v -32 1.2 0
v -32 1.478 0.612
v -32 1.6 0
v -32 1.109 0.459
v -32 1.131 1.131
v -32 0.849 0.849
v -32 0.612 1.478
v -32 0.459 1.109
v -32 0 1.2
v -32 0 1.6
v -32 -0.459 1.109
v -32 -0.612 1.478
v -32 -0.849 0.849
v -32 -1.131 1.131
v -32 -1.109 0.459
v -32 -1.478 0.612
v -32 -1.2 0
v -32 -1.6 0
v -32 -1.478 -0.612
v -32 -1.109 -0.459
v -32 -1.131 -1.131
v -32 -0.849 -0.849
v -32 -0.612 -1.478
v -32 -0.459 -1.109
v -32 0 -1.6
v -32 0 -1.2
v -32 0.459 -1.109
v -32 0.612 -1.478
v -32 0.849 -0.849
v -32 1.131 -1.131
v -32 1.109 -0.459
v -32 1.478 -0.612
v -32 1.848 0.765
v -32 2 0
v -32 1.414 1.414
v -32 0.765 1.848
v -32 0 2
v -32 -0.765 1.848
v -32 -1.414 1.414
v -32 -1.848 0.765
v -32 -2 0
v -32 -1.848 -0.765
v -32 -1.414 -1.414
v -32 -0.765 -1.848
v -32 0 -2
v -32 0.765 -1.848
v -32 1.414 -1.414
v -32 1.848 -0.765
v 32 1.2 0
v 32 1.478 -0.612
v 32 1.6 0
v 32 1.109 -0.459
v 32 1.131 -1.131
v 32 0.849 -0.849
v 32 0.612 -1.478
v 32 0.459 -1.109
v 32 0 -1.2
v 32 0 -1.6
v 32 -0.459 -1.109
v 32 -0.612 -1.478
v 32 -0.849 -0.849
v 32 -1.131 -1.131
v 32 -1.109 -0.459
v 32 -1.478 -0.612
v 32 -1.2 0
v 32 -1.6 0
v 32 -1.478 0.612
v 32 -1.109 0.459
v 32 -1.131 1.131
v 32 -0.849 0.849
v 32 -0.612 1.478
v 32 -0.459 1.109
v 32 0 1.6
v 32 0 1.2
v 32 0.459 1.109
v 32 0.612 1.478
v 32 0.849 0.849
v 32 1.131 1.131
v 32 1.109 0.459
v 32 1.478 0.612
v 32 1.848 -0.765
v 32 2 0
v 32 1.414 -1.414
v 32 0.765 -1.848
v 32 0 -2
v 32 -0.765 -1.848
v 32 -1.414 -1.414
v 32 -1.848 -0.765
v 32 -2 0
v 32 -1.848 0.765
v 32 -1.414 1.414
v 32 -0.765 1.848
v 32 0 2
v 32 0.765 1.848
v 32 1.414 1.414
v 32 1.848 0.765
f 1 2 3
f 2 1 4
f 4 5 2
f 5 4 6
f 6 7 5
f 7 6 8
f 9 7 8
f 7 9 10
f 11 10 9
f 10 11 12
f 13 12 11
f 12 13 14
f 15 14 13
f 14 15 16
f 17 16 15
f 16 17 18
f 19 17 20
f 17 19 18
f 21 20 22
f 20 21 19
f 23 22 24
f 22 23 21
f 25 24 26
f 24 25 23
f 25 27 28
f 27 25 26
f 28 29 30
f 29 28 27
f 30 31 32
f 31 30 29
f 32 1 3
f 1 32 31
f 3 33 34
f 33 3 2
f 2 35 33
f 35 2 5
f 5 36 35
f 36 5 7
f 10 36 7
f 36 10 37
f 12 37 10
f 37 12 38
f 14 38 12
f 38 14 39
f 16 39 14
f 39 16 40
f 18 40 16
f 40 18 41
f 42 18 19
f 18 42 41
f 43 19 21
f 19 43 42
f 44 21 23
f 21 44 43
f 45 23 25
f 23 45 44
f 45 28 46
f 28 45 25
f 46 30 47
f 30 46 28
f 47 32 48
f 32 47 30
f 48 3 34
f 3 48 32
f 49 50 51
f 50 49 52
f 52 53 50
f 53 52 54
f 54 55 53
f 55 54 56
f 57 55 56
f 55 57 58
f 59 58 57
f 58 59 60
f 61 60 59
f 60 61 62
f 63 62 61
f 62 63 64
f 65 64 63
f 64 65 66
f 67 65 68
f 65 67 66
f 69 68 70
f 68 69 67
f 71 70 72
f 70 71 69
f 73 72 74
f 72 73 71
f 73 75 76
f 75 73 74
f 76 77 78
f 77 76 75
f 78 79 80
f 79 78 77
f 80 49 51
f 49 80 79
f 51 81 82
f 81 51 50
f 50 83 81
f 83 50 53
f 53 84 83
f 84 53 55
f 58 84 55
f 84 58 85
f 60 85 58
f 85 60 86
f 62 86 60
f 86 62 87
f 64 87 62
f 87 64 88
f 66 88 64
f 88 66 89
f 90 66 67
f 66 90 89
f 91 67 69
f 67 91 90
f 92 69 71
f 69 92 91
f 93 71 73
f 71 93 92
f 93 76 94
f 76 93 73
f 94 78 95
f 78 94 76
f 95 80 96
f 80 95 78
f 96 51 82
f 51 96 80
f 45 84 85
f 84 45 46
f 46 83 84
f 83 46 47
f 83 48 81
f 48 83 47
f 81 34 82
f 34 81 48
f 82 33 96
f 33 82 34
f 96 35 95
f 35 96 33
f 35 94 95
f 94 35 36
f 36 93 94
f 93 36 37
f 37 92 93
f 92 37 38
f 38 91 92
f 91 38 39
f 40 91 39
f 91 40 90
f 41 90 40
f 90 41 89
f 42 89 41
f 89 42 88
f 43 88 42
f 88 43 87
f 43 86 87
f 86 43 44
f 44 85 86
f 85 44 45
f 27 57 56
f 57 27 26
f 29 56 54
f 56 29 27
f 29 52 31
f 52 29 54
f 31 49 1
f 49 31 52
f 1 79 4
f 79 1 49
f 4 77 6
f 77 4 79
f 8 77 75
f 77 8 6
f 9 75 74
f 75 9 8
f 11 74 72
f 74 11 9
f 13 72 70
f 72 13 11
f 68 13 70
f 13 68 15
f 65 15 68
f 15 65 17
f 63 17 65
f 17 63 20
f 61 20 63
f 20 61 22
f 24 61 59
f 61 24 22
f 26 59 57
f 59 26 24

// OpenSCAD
// file: ../p/4-4cyli.scad
use <../lib.scad>
function ldraw_lib__4_4cyli() = [
// 0 Cylinder 1.0
// 0 Name: 4-4cyli.dat
// 0 Author: James Jessiman
// 0 !LDRAW_ORG Primitive UPDATE 2005-01
// 0 !LICENSE Licensed under CC BY 2.0 and CC BY 4.0 : see CAreadme.txt
// 
// 0 BFC CERTIFY CCW
  [0,"BFC","CERTIFY"],
  [0,"BFC","CCW"],
// 
// 0 !HISTORY 1998-12-15 [PTadmin] Official Update 1998-10
// 0 !HISTORY 2002-03-23 [sbliss] Added BFC statement; merged headers from files in distributions LDraw 0.27 and Complete.
// 0 !HISTORY 2002-04-25 [PTadmin] Official Update 2002-02
// 0 !HISTORY 2004-12-14 [guyvivan] BFC CCW
// 0 !HISTORY 2005-12-28 [PTadmin] Official Update 2005-01
// 0 !HISTORY 2007-06-24 [PTadmin] Header formatted for Contributor Agreement
// 0 !HISTORY 2008-07-01 [PTadmin] Official Update 2008-01
// 
// 
// 4 16 1 1 0 0.9239 1 0.3827 0.9239 0 0.3827 1 0 0
  [4,16,1,1,0,0.9239,1,0.3827,0.9239,0,0.3827,1,0,0],
// 5 24 1 0 0 1 1 0 0.9239 0 0.3827 0.9239 0 -0.3827
  [5,24,1,0,0,1,1,0,0.9239,0,0.3827,0.9239,0,-0.3827],
// 4 16 0.9239 1 0.3827 0.7071 1 0.7071 0.7071 0 0.7071 0.9239 0 0.3827
  [4,16,0.9239,1,0.3827,0.7071,1,0.7071,0.7071,0,0.7071,0.9239,0,0.3827],
// 5 24 0.9239 0 0.3827 0.9239 1 0.3827 0.7071 0 0.7071 1 0 0
  [5,24,0.9239,0,0.3827,0.9239,1,0.3827,0.7071,0,0.7071,1,0,0],
// 4 16 0.7071 1 0.7071 0.3827 1 0.9239 0.3827 0 0.9239 0.7071 0 0.7071
  [4,16,0.7071,1,0.7071,0.3827,1,0.9239,0.3827,0,0.9239,0.7071,0,0.7071],
// 5 24 0.7071 0 0.7071 0.7071 1 0.7071 0.3827 0 0.9239 0.9239 0 0.3827
  [5,24,0.7071,0,0.7071,0.7071,1,0.7071,0.3827,0,0.9239,0.9239,0,0.3827],
// 4 16 0.3827 1 0.9239 0 1 1 0 0 1 0.3827 0 0.9239
  [4,16,0.3827,1,0.9239,0,1,1,0,0,1,0.3827,0,0.9239],
// 5 24 0.3827 0 0.9239 0.3827 1 0.9239 0 0 1 0.7071 0 0.7071
  [5,24,0.3827,0,0.9239,0.3827,1,0.9239,0,0,1,0.7071,0,0.7071],
// 4 16 0 1 1 -0.3827 1 0.9239 -0.3827 0 0.9239 0 0 1
  [4,16,0,1,1,-0.3827,1,0.9239,-0.3827,0,0.9239,0,0,1],
// 5 24 0 0 1 0 1 1 -0.3827 0 0.9239 0.3827 0 0.9239
  [5,24,0,0,1,0,1,1,-0.3827,0,0.9239,0.3827,0,0.9239],
// 4 16 -0.3827 1 0.9239 -0.7071 1 0.7071 -0.7071 0 0.7071 -0.3827 0 0.9239
  [4,16,-0.3827,1,0.9239,-0.7071,1,0.7071,-0.7071,0,0.7071,-0.3827,0,0.9239],
// 5 24 -0.3827 0 0.9239 -0.3827 1 0.9239 -0.7071 0 0.7071 0 0 1
  [5,24,-0.3827,0,0.9239,-0.3827,1,0.9239,-0.7071,0,0.7071,0,0,1],
// 4 16 -0.7071 1 0.7071 -0.9239 1 0.3827 -0.9239 0 0.3827 -0.7071 0 0.7071
  [4,16,-0.7071,1,0.7071,-0.9239,1,0.3827,-0.9239,0,0.3827,-0.7071,0,0.7071],
// 5 24 -0.7071 0 0.7071 -0.7071 1 0.7071 -0.9239 0 0.3827 -0.3827 0 0.9239
  [5,24,-0.7071,0,0.7071,-0.7071,1,0.7071,-0.9239,0,0.3827,-0.3827,0,0.9239],
// 4 16 -0.9239 1 0.3827 -1 1 0 -1 0 0 -0.9239 0 0.3827
  [4,16,-0.9239,1,0.3827,-1,1,0,-1,0,0,-0.9239,0,0.3827],
// 5 24 -0.9239 0 0.3827 -0.9239 1 0.3827 -1 0 0 -0.7071 0 0.7071
  [5,24,-0.9239,0,0.3827,-0.9239,1,0.3827,-1,0,0,-0.7071,0,0.7071],
// 4 16 -1 1 0 -0.9239 1 -0.3827 -0.9239 0 -0.3827 -1 0 0
  [4,16,-1,1,0,-0.9239,1,-0.3827,-0.9239,0,-0.3827,-1,0,0],
// 5 24 -1 0 0 -1 1 0 -0.9239 0 -0.3827 -0.9239 0 0.3827
  [5,24,-1,0,0,-1,1,0,-0.9239,0,-0.3827,-0.9239,0,0.3827],
// 4 16 -0.9239 1 -0.3827 -0.7071 1 -0.7071 -0.7071 0 -0.7071 -0.9239 0 -0.3827
  [4,16,-0.9239,1,-0.3827,-0.7071,1,-0.7071,-0.7071,0,-0.7071,-0.9239,0,-0.3827],
// 5 24 -0.9239 0 -0.3827 -0.9239 1 -0.3827 -0.7071 0 -0.7071 -1 0 0
  [5,24,-0.9239,0,-0.3827,-0.9239,1,-0.3827,-0.7071,0,-0.7071,-1,0,0],
// 4 16 -0.7071 1 -0.7071 -0.3827 1 -0.9239 -0.3827 0 -0.9239 -0.7071 0 -0.7071
  [4,16,-0.7071,1,-0.7071,-0.3827,1,-0.9239,-0.3827,0,-0.9239,-0.7071,0,-0.7071],
// 5 24 -0.7071 0 -0.7071 -0.7071 1 -0.7071 -0.3827 0 -0.9239 -0.9239 0 -0.3827
  [5,24,-0.7071,0,-0.7071,-0.7071,1,-0.7071,-0.3827,0,-0.9239,-0.9239,0,-0.3827],
// 4 16 -0.3827 1 -0.9239 0 1 -1 0 0 -1 -0.3827 0 -0.9239
  [4,16,-0.3827,1,-0.9239,0,1,-1,0,0,-1,-0.3827,0,-0.9239],
// 5 24 -0.3827 0 -0.9239 -0.3827 1 -0.9239 0 0 -1 -0.7071 0 -0.7071
  [5,24,-0.3827,0,-0.9239,-0.3827,1,-0.9239,0,0,-1,-0.7071,0,-0.7071],
// 4 16 0 1 -1 0.3827 1 -0.9239 0.3827 0 -0.9239 0 0 -1
  [4,16,0,1,-1,0.3827,1,-0.9239,0.3827,0,-0.9239,0,0,-1],
// 5 24 0 0 -1 0 1 -1 0.3827 0 -0.9239 -0.3827 0 -0.9239
  [5,24,0,0,-1,0,1,-1,0.3827,0,-0.9239,-0.3827,0,-0.9239],
// 4 16 0.3827 1 -0.9239 0.7071 1 -0.7071 0.7071 0 -0.7071 0.3827 0 -0.9239
  [4,16,0.3827,1,-0.9239,0.7071,1,-0.7071,0.7071,0,-0.7071,0.3827,0,-0.9239],
// 5 24 0.3827 0 -0.9239 0.3827 1 -0.9239 0.7071 0 -0.7071 0 0 -1
  [5,24,0.3827,0,-0.9239,0.3827,1,-0.9239,0.7071,0,-0.7071,0,0,-1],
// 4 16 0.7071 1 -0.7071 0.9239 1 -0.3827 0.9239 0 -0.3827 0.7071 0 -0.7071
  [4,16,0.7071,1,-0.7071,0.9239,1,-0.3827,0.9239,0,-0.3827,0.7071,0,-0.7071],
// 5 24 0.7071 0 -0.7071 0.7071 1 -0.7071 0.9239 0 -0.3827 0.3827 0 -0.9239
  [5,24,0.7071,0,-0.7071,0.7071,1,-0.7071,0.9239,0,-0.3827,0.3827,0,-0.9239],
// 4 16 0.9239 1 -0.3827 1 1 0 1 0 0 0.9239 0 -0.3827
  [4,16,0.9239,1,-0.3827,1,1,0,1,0,0,0.9239,0,-0.3827],
// 5 24 0.9239 0 -0.3827 0.9239 1 -0.3827 1 0 0 0.7071 0 -0.7071
  [5,24,0.9239,0,-0.3827,0.9239,1,-0.3827,1,0,0,0.7071,0,-0.7071],
// 0
];
makepoly(ldraw_lib__4_4cyli(), line=0.2);
// file: ../p/4-4ring4.scad
use <../lib.scad>
function ldraw_lib__4_4ring4() = [
// 0 Ring  4 x 1.0
// 0 Name: 4-4ring4.dat
// 0 Author: James Jessiman
// 0 !LDRAW_ORG Primitive UPDATE 2009-01
// 0 !LICENSE Licensed under CC BY 2.0 and CC BY 4.0 : see CAreadme.txt
// 
// 0 BFC CERTIFY CCW
  [0,"BFC","CERTIFY"],
  [0,"BFC","CCW"],
// 
// 0 !HISTORY 1998-12-15 [PTadmin] Official Update 1998-10
// 0 !HISTORY 2002-04-08 [BrickCaster] Modified for BFC compliance
// 0 !HISTORY 2002-04-25 [PTadmin] Official Update 2002-02
// 0 !HISTORY 2007-06-24 [PTadmin] Header formatted for Contributor Agreement
// 0 !HISTORY 2008-07-01 [PTadmin] Official Update 2008-01
// 0 !HISTORY 2008-08-26 [cwdee] Switch polygon winding and rename
// 0 !HISTORY 2009-05-02 [PTadmin] Official Update 2009-01
// 
// 
// 4 16 -1.9135 0 4.6195 -1.5308 0 3.6956 0 0 4 0 0 5
  [4,16,-1.9135,0,4.6195,-1.5308,0,3.6956,0,0,4,0,0,5],
// 4 16 -3.5355 0 3.5355 -2.8284 0 2.8284 -1.5308 0 3.6956 -1.9135 0 4.6195
  [4,16,-3.5355,0,3.5355,-2.8284,0,2.8284,-1.5308,0,3.6956,-1.9135,0,4.6195],
// 4 16 -4.6195 0 1.9135 -3.6956 0 1.5308 -2.8284 0 2.8284 -3.5355 0 3.5355
  [4,16,-4.6195,0,1.9135,-3.6956,0,1.5308,-2.8284,0,2.8284,-3.5355,0,3.5355],
// 4 16 -5 0 0 -4 0 0 -3.6956 0 1.5308 -4.6195 0 1.9135
  [4,16,-5,0,0,-4,0,0,-3.6956,0,1.5308,-4.6195,0,1.9135],
// 4 16 -4.6195 0 -1.9135 -3.6956 0 -1.5308 -4 0 0 -5 0 0
  [4,16,-4.6195,0,-1.9135,-3.6956,0,-1.5308,-4,0,0,-5,0,0],
// 4 16 -3.5355 0 -3.5355 -2.8284 0 -2.8284 -3.6956 0 -1.5308 -4.6195 0 -1.9135
  [4,16,-3.5355,0,-3.5355,-2.8284,0,-2.8284,-3.6956,0,-1.5308,-4.6195,0,-1.9135],
// 4 16 -1.9135 0 -4.6195 -1.5308 0 -3.6956 -2.8284 0 -2.8284 -3.5355 0 -3.5355
  [4,16,-1.9135,0,-4.6195,-1.5308,0,-3.6956,-2.8284,0,-2.8284,-3.5355,0,-3.5355],
// 4 16 0 0 -5 0 0 -4 -1.5308 0 -3.6956 -1.9135 0 -4.6195
  [4,16,0,0,-5,0,0,-4,-1.5308,0,-3.6956,-1.9135,0,-4.6195],
// 4 16 1.9135 0 -4.6195 1.5308 0 -3.6956 0 0 -4 0 0 -5
  [4,16,1.9135,0,-4.6195,1.5308,0,-3.6956,0,0,-4,0,0,-5],
// 4 16 3.5355 0 -3.5355 2.8284 0 -2.8284 1.5308 0 -3.6956 1.9135 0 -4.6195
  [4,16,3.5355,0,-3.5355,2.8284,0,-2.8284,1.5308,0,-3.6956,1.9135,0,-4.6195],
// 4 16 4.6195 0 -1.9135 3.6956 0 -1.5308 2.8284 0 -2.8284 3.5355 0 -3.5355
  [4,16,4.6195,0,-1.9135,3.6956,0,-1.5308,2.8284,0,-2.8284,3.5355,0,-3.5355],
// 4 16 5 0 0 4 0 0 3.6956 0 -1.5308 4.6195 0 -1.9135
  [4,16,5,0,0,4,0,0,3.6956,0,-1.5308,4.6195,0,-1.9135],
// 4 16 4.6195 0 1.9135 3.6956 0 1.5308 4 0 0 5 0 0
  [4,16,4.6195,0,1.9135,3.6956,0,1.5308,4,0,0,5,0,0],
// 4 16 3.5355 0 3.5355 2.8284 0 2.8284 3.6956 0 1.5308 4.6195 0 1.9135
  [4,16,3.5355,0,3.5355,2.8284,0,2.8284,3.6956,0,1.5308,4.6195,0,1.9135],
// 4 16 1.9135 0 4.6195 1.5308 0 3.6956 2.8284 0 2.8284 3.5355 0 3.5355
  [4,16,1.9135,0,4.6195,1.5308,0,3.6956,2.8284,0,2.8284,3.5355,0,3.5355],
// 4 16 0 0 5 0 0 4 1.5308 0 3.6956 1.9135 0 4.6195
  [4,16,0,0,5,0,0,4,1.5308,0,3.6956,1.9135,0,4.6195],
// 0
];
makepoly(ldraw_lib__4_4ring4(), line=0.2);
// file: ../p/4-4ring3.scad
use <../lib.scad>
function ldraw_lib__4_4ring3() = [
// 0 Ring  3 x 1.0
// 0 Name: 4-4ring3.dat
// 0 Author: James Jessiman
// 0 !LDRAW_ORG Primitive UPDATE 2009-01
// 0 !LICENSE Licensed under CC BY 2.0 and CC BY 4.0 : see CAreadme.txt
// 
// 0 BFC CERTIFY CCW
  [0,"BFC","CERTIFY"],
  [0,"BFC","CCW"],
// 
// 0 !HISTORY 1998-12-15 [PTadmin] Official Update 1998-10
// 0 !HISTORY 2002-04-05 [hafhead] Added BFC statement
// 0 !HISTORY 2002-04-25 [PTadmin] Official Update 2002-02
// 0 !HISTORY 2007-06-24 [PTadmin] Header formatted for Contributor Agreement
// 0 !HISTORY 2008-07-01 [PTadmin] Official Update 2008-01
// 0 !HISTORY 2008-08-26 [cwdee] Switch polygon winding and rename
// 0 !HISTORY 2009-05-02 [PTadmin] Official Update 2009-01
// 
// 
// 4 16 -1.5308 0 3.6956 -1.1481 0 2.7717 0 0 3 0 0 4
  [4,16,-1.5308,0,3.6956,-1.1481,0,2.7717,0,0,3,0,0,4],
// 4 16 -2.8284 0 2.8284 -2.1213 0 2.1213 -1.1481 0 2.7717 -1.5308 0 3.6956
  [4,16,-2.8284,0,2.8284,-2.1213,0,2.1213,-1.1481,0,2.7717,-1.5308,0,3.6956],
// 4 16 -3.6956 0 1.5308 -2.7717 0 1.1481 -2.1213 0 2.1213 -2.8284 0 2.8284
  [4,16,-3.6956,0,1.5308,-2.7717,0,1.1481,-2.1213,0,2.1213,-2.8284,0,2.8284],
// 4 16 -4 0 0 -3 0 0 -2.7717 0 1.1481 -3.6956 0 1.5308
  [4,16,-4,0,0,-3,0,0,-2.7717,0,1.1481,-3.6956,0,1.5308],
// 4 16 -3.6956 0 -1.5308 -2.7717 0 -1.1481 -3 0 0 -4 0 0
  [4,16,-3.6956,0,-1.5308,-2.7717,0,-1.1481,-3,0,0,-4,0,0],
// 4 16 -2.8284 0 -2.8284 -2.1213 0 -2.1213 -2.7717 0 -1.1481 -3.6956 0 -1.5308
  [4,16,-2.8284,0,-2.8284,-2.1213,0,-2.1213,-2.7717,0,-1.1481,-3.6956,0,-1.5308],
// 4 16 -1.5308 0 -3.6956 -1.1481 0 -2.7717 -2.1213 0 -2.1213 -2.8284 0 -2.8284
  [4,16,-1.5308,0,-3.6956,-1.1481,0,-2.7717,-2.1213,0,-2.1213,-2.8284,0,-2.8284],
// 4 16 0 0 -4 0 0 -3 -1.1481 0 -2.7717 -1.5308 0 -3.6956
  [4,16,0,0,-4,0,0,-3,-1.1481,0,-2.7717,-1.5308,0,-3.6956],
// 4 16 1.5308 0 -3.6956 1.1481 0 -2.7717 0 0 -3 0 0 -4
  [4,16,1.5308,0,-3.6956,1.1481,0,-2.7717,0,0,-3,0,0,-4],
// 4 16 2.8284 0 -2.8284 2.1213 0 -2.1213 1.1481 0 -2.7717 1.5308 0 -3.6956
  [4,16,2.8284,0,-2.8284,2.1213,0,-2.1213,1.1481,0,-2.7717,1.5308,0,-3.6956],
// 4 16 3.6956 0 -1.5308 2.7717 0 -1.1481 2.1213 0 -2.1213 2.8284 0 -2.8284
  [4,16,3.6956,0,-1.5308,2.7717,0,-1.1481,2.1213,0,-2.1213,2.8284,0,-2.8284],
// 4 16 4 0 0 3 0 0 2.7717 0 -1.1481 3.6956 0 -1.5308
  [4,16,4,0,0,3,0,0,2.7717,0,-1.1481,3.6956,0,-1.5308],
// 4 16 3.6956 0 1.5308 2.7717 0 1.1481 3 0 0 4 0 0
  [4,16,3.6956,0,1.5308,2.7717,0,1.1481,3,0,0,4,0,0],
// 4 16 2.8284 0 2.8284 2.1213 0 2.1213 2.7717 0 1.1481 3.6956 0 1.5308
  [4,16,2.8284,0,2.8284,2.1213,0,2.1213,2.7717,0,1.1481,3.6956,0,1.5308],
// 4 16 1.5308 0 3.6956 1.1481 0 2.7717 2.1213 0 2.1213 2.8284 0 2.8284
  [4,16,1.5308,0,3.6956,1.1481,0,2.7717,2.1213,0,2.1213,2.8284,0,2.8284],
// 4 16 0 0 4 0 0 3 1.1481 0 2.7717 1.5308 0 3.6956
  [4,16,0,0,4,0,0,3,1.1481,0,2.7717,1.5308,0,3.6956],
// 0
];
makepoly(ldraw_lib__4_4ring3(), line=0.2);
// file: ../p/4-4edge.scad
use <../lib.scad>
function ldraw_lib__4_4edge() = [
// 0 Circle 1.0
// 0 Name: 4-4edge.dat
// 0 Author: James Jessiman
// 0 !LDRAW_ORG Primitive UPDATE 2017-01
// 0 !LICENSE Licensed under CC BY 2.0 and CC BY 4.0 : see CAreadme.txt
// 
// 0 BFC CERTIFY CCW
  [0,"BFC","CERTIFY"],
  [0,"BFC","CCW"],
// 
// 0 !HISTORY 1998-12-15 [PTadmin] Official Update 1998-10
// 0 !HISTORY 2005-12-28 [PTadmin] Official Update 2005-01
// 0 !HISTORY 2007-06-24 [PTadmin] Header formatted for Contributor Agreement
// 0 !HISTORY 2008-07-01 [PTadmin] Official Update 2008-01
// 0 !HISTORY 2017-01-15 [Steffen] BFCed
// 0 !HISTORY 2017-12-30 [PTadmin] Official Update 2017-01
// 
// 
// 2 24 1 0 0 0.9239 0 0.3827
  [2,24,1,0,0,0.9239,0,0.3827],
// 2 24 0.9239 0 0.3827 0.7071 0 0.7071
  [2,24,0.9239,0,0.3827,0.7071,0,0.7071],
// 2 24 0.7071 0 0.7071 0.3827 0 0.9239
  [2,24,0.7071,0,0.7071,0.3827,0,0.9239],
// 2 24 0.3827 0 0.9239 0 0 1
  [2,24,0.3827,0,0.9239,0,0,1],
// 2 24 0 0 1 -0.3827 0 0.9239
  [2,24,0,0,1,-0.3827,0,0.9239],
// 2 24 -0.3827 0 0.9239 -0.7071 0 0.7071
  [2,24,-0.3827,0,0.9239,-0.7071,0,0.7071],
// 2 24 -0.7071 0 0.7071 -0.9239 0 0.3827
  [2,24,-0.7071,0,0.7071,-0.9239,0,0.3827],
// 2 24 -0.9239 0 0.3827 -1 0 -0
  [2,24,-0.9239,0,0.3827,-1,0,-0],
// 2 24 -1 0 -0 -0.9239 0 -0.3827
  [2,24,-1,0,-0,-0.9239,0,-0.3827],
// 2 24 -0.9239 0 -0.3827 -0.7071 0 -0.7071
  [2,24,-0.9239,0,-0.3827,-0.7071,0,-0.7071],
// 2 24 -0.7071 0 -0.7071 -0.3827 0 -0.9239
  [2,24,-0.7071,0,-0.7071,-0.3827,0,-0.9239],
// 2 24 -0.3827 0 -0.9239 0 0 -1
  [2,24,-0.3827,0,-0.9239,0,0,-1],
// 2 24 0 0 -1 0.3827 0 -0.9239
  [2,24,0,0,-1,0.3827,0,-0.9239],
// 2 24 0.3827 0 -0.9239 0.7071 0 -0.7071
  [2,24,0.3827,0,-0.9239,0.7071,0,-0.7071],
// 2 24 0.7071 0 -0.7071 0.9239 0 -0.3827
  [2,24,0.7071,0,-0.7071,0.9239,0,-0.3827],
// 2 24 0.9239 0 -0.3827 1 0 0
  [2,24,0.9239,0,-0.3827,1,0,0],
];
makepoly(ldraw_lib__4_4edge(), line=0.2);
// file: 71533k03.scad
use <../lib.scad>
use <../p/4-4cyli.scad>
function ldraw_lib__71533k03() = [
// 0 ~Technic Pneumatic Tube Segment
// 0 Name: 71533k03.dat
// 0 Author: Jaco van der Molen [Jaco]
// 0 !LDRAW_ORG Part Flexible_Section UPDATE 2020-01
// 0 !LICENSE Licensed under CC BY 2.0 and CC BY 4.0 : see CAreadme.txt
// 
// 0 BFC CERTIFY CW
  [0,"BFC","CERTIFY"],
  [0,"BFC","CW"],
// 
// 0 !HISTORY 2003-11-30 [Steffen] BFCed
// 0 !HISTORY 2009-12-29 [PTadmin] Official Update 2009-03
// 0 !HISTORY 2020-06-27 [PTadmin] Renamed from 166
// 0 !HISTORY 2020-06-28 [PTadmin] Official Update 2020-01
// 
// 
// 1 16 0 0 0 5 0 0 0 1 0 0 0 5 4-4cyli.dat
  [1,16,0,0,0,5,0,0,0,1,0,0,0,5, ldraw_lib__4_4cyli()],
// 0 BFC INVERTNEXT
  [0,"BFC","INVERTNEXT"],
// 1 16 0 0 0 3 0 0 0 1 0 0 0 3 4-4cyli.dat
  [1,16,0,0,0,3,0,0,0,1,0,0,0,3, ldraw_lib__4_4cyli()],
// 0
];
makepoly(ldraw_lib__71533k03(), line=0.2);
// file: 71533k02.scad
use <../lib.scad>
use <../p/4-4edge.scad>
use <../p/4-4ring3.scad>
use <../p/4-4ring4.scad>
function ldraw_lib__71533k02() = [
// 0 ~Technic Pneumatic Tube End (Non-Bulged)
// 0 Name: 71533k02.dat
// 0 Author: Steffen [Steffen]
// 0 !LDRAW_ORG Part Flexible_Section UPDATE 2020-01
// 0 !LICENSE Licensed under CC BY 2.0 and CC BY 4.0 : see CAreadme.txt
// 
// 0 BFC CERTIFY CCW
  [0,"BFC","CERTIFY"],
  [0,"BFC","CCW"],
// 
// 0 !HISTORY 2020-06-28 [PTadmin] Official Update 2020-01
// 
// 
// 0 // This file goes together with 71533k01.dat and 71533k03.dat.
// 0 // Those 3 files can be used to create Technic Pneumatic Tubes
// 0 // with either bulged or non-bulged ends.
// 
// 1 16 0 0 0 1 0 0 0 1 0 0 0 1 4-4ring3.dat
  [1,16,0,0,0,1,0,0,0,1,0,0,0,1, ldraw_lib__4_4ring3()],
// 1 16 0 0 0 1 0 0 0 1 0 0 0 1 4-4ring4.dat
  [1,16,0,0,0,1,0,0,0,1,0,0,0,1, ldraw_lib__4_4ring4()],
// 1 16 0 0 0 3 0 0 0 3 0 0 0 3 4-4edge.dat
  [1,16,0,0,0,3,0,0,0,3,0,0,0,3, ldraw_lib__4_4edge()],
// 1 16 0 0 0 5 0 0 0 5 0 0 0 5 4-4edge.dat
  [1,16,0,0,0,5,0,0,0,5,0,0,0,5, ldraw_lib__4_4edge()],
];
makepoly(ldraw_lib__71533k02(), line=0.2);
// main file
use <../lib.scad>
use <71533k02.scad>
use <71533k03.scad>
function ldraw_lib__21837_f1() = [
// 0 Technic Pneumatic Tube  8L
// 0 Name: 21837-f1.dat
// 0 Author: Philippe Hurbain [Philo]
// 0 !LDRAW_ORG Part UPDATE 2020-01
// 0 !LICENSE Licensed under CC BY 2.0 and CC BY 4.0 : see CAreadme.txt
// 
// 0 BFC CERTIFY CCW
  [0,"BFC","CERTIFY"],
  [0,"BFC","CCW"],
// 
// 0 !KEYWORDS 64 mm
// 
// 0 !HISTORY 2020-06-28 [PTadmin] Official Update 2020-01
// 
// 
// 1 16 -80 0 0 0 1 0 1 0 0 0 0 1 71533k02.dat
  [1,16,-80,0,0,0,1,0,1,0,0,0,0,1, ldraw_lib__71533k02()],
// 1 16 80 0 0 0 -1 0 -1 0 0 0 0 1 71533k02.dat
  [1,16,80,0,0,0,-1,0,-1,0,0,0,0,1, ldraw_lib__71533k02()],
// 1 16 -80 0 0 0 160 0 1 0 0 0 0 1 71533k03.dat
  [1,16,-80,0,0,0,160,0,1,0,0,0,0,1, ldraw_lib__71533k03()],
];
makepoly(ldraw_lib__21837_f1(), line=0.2);
